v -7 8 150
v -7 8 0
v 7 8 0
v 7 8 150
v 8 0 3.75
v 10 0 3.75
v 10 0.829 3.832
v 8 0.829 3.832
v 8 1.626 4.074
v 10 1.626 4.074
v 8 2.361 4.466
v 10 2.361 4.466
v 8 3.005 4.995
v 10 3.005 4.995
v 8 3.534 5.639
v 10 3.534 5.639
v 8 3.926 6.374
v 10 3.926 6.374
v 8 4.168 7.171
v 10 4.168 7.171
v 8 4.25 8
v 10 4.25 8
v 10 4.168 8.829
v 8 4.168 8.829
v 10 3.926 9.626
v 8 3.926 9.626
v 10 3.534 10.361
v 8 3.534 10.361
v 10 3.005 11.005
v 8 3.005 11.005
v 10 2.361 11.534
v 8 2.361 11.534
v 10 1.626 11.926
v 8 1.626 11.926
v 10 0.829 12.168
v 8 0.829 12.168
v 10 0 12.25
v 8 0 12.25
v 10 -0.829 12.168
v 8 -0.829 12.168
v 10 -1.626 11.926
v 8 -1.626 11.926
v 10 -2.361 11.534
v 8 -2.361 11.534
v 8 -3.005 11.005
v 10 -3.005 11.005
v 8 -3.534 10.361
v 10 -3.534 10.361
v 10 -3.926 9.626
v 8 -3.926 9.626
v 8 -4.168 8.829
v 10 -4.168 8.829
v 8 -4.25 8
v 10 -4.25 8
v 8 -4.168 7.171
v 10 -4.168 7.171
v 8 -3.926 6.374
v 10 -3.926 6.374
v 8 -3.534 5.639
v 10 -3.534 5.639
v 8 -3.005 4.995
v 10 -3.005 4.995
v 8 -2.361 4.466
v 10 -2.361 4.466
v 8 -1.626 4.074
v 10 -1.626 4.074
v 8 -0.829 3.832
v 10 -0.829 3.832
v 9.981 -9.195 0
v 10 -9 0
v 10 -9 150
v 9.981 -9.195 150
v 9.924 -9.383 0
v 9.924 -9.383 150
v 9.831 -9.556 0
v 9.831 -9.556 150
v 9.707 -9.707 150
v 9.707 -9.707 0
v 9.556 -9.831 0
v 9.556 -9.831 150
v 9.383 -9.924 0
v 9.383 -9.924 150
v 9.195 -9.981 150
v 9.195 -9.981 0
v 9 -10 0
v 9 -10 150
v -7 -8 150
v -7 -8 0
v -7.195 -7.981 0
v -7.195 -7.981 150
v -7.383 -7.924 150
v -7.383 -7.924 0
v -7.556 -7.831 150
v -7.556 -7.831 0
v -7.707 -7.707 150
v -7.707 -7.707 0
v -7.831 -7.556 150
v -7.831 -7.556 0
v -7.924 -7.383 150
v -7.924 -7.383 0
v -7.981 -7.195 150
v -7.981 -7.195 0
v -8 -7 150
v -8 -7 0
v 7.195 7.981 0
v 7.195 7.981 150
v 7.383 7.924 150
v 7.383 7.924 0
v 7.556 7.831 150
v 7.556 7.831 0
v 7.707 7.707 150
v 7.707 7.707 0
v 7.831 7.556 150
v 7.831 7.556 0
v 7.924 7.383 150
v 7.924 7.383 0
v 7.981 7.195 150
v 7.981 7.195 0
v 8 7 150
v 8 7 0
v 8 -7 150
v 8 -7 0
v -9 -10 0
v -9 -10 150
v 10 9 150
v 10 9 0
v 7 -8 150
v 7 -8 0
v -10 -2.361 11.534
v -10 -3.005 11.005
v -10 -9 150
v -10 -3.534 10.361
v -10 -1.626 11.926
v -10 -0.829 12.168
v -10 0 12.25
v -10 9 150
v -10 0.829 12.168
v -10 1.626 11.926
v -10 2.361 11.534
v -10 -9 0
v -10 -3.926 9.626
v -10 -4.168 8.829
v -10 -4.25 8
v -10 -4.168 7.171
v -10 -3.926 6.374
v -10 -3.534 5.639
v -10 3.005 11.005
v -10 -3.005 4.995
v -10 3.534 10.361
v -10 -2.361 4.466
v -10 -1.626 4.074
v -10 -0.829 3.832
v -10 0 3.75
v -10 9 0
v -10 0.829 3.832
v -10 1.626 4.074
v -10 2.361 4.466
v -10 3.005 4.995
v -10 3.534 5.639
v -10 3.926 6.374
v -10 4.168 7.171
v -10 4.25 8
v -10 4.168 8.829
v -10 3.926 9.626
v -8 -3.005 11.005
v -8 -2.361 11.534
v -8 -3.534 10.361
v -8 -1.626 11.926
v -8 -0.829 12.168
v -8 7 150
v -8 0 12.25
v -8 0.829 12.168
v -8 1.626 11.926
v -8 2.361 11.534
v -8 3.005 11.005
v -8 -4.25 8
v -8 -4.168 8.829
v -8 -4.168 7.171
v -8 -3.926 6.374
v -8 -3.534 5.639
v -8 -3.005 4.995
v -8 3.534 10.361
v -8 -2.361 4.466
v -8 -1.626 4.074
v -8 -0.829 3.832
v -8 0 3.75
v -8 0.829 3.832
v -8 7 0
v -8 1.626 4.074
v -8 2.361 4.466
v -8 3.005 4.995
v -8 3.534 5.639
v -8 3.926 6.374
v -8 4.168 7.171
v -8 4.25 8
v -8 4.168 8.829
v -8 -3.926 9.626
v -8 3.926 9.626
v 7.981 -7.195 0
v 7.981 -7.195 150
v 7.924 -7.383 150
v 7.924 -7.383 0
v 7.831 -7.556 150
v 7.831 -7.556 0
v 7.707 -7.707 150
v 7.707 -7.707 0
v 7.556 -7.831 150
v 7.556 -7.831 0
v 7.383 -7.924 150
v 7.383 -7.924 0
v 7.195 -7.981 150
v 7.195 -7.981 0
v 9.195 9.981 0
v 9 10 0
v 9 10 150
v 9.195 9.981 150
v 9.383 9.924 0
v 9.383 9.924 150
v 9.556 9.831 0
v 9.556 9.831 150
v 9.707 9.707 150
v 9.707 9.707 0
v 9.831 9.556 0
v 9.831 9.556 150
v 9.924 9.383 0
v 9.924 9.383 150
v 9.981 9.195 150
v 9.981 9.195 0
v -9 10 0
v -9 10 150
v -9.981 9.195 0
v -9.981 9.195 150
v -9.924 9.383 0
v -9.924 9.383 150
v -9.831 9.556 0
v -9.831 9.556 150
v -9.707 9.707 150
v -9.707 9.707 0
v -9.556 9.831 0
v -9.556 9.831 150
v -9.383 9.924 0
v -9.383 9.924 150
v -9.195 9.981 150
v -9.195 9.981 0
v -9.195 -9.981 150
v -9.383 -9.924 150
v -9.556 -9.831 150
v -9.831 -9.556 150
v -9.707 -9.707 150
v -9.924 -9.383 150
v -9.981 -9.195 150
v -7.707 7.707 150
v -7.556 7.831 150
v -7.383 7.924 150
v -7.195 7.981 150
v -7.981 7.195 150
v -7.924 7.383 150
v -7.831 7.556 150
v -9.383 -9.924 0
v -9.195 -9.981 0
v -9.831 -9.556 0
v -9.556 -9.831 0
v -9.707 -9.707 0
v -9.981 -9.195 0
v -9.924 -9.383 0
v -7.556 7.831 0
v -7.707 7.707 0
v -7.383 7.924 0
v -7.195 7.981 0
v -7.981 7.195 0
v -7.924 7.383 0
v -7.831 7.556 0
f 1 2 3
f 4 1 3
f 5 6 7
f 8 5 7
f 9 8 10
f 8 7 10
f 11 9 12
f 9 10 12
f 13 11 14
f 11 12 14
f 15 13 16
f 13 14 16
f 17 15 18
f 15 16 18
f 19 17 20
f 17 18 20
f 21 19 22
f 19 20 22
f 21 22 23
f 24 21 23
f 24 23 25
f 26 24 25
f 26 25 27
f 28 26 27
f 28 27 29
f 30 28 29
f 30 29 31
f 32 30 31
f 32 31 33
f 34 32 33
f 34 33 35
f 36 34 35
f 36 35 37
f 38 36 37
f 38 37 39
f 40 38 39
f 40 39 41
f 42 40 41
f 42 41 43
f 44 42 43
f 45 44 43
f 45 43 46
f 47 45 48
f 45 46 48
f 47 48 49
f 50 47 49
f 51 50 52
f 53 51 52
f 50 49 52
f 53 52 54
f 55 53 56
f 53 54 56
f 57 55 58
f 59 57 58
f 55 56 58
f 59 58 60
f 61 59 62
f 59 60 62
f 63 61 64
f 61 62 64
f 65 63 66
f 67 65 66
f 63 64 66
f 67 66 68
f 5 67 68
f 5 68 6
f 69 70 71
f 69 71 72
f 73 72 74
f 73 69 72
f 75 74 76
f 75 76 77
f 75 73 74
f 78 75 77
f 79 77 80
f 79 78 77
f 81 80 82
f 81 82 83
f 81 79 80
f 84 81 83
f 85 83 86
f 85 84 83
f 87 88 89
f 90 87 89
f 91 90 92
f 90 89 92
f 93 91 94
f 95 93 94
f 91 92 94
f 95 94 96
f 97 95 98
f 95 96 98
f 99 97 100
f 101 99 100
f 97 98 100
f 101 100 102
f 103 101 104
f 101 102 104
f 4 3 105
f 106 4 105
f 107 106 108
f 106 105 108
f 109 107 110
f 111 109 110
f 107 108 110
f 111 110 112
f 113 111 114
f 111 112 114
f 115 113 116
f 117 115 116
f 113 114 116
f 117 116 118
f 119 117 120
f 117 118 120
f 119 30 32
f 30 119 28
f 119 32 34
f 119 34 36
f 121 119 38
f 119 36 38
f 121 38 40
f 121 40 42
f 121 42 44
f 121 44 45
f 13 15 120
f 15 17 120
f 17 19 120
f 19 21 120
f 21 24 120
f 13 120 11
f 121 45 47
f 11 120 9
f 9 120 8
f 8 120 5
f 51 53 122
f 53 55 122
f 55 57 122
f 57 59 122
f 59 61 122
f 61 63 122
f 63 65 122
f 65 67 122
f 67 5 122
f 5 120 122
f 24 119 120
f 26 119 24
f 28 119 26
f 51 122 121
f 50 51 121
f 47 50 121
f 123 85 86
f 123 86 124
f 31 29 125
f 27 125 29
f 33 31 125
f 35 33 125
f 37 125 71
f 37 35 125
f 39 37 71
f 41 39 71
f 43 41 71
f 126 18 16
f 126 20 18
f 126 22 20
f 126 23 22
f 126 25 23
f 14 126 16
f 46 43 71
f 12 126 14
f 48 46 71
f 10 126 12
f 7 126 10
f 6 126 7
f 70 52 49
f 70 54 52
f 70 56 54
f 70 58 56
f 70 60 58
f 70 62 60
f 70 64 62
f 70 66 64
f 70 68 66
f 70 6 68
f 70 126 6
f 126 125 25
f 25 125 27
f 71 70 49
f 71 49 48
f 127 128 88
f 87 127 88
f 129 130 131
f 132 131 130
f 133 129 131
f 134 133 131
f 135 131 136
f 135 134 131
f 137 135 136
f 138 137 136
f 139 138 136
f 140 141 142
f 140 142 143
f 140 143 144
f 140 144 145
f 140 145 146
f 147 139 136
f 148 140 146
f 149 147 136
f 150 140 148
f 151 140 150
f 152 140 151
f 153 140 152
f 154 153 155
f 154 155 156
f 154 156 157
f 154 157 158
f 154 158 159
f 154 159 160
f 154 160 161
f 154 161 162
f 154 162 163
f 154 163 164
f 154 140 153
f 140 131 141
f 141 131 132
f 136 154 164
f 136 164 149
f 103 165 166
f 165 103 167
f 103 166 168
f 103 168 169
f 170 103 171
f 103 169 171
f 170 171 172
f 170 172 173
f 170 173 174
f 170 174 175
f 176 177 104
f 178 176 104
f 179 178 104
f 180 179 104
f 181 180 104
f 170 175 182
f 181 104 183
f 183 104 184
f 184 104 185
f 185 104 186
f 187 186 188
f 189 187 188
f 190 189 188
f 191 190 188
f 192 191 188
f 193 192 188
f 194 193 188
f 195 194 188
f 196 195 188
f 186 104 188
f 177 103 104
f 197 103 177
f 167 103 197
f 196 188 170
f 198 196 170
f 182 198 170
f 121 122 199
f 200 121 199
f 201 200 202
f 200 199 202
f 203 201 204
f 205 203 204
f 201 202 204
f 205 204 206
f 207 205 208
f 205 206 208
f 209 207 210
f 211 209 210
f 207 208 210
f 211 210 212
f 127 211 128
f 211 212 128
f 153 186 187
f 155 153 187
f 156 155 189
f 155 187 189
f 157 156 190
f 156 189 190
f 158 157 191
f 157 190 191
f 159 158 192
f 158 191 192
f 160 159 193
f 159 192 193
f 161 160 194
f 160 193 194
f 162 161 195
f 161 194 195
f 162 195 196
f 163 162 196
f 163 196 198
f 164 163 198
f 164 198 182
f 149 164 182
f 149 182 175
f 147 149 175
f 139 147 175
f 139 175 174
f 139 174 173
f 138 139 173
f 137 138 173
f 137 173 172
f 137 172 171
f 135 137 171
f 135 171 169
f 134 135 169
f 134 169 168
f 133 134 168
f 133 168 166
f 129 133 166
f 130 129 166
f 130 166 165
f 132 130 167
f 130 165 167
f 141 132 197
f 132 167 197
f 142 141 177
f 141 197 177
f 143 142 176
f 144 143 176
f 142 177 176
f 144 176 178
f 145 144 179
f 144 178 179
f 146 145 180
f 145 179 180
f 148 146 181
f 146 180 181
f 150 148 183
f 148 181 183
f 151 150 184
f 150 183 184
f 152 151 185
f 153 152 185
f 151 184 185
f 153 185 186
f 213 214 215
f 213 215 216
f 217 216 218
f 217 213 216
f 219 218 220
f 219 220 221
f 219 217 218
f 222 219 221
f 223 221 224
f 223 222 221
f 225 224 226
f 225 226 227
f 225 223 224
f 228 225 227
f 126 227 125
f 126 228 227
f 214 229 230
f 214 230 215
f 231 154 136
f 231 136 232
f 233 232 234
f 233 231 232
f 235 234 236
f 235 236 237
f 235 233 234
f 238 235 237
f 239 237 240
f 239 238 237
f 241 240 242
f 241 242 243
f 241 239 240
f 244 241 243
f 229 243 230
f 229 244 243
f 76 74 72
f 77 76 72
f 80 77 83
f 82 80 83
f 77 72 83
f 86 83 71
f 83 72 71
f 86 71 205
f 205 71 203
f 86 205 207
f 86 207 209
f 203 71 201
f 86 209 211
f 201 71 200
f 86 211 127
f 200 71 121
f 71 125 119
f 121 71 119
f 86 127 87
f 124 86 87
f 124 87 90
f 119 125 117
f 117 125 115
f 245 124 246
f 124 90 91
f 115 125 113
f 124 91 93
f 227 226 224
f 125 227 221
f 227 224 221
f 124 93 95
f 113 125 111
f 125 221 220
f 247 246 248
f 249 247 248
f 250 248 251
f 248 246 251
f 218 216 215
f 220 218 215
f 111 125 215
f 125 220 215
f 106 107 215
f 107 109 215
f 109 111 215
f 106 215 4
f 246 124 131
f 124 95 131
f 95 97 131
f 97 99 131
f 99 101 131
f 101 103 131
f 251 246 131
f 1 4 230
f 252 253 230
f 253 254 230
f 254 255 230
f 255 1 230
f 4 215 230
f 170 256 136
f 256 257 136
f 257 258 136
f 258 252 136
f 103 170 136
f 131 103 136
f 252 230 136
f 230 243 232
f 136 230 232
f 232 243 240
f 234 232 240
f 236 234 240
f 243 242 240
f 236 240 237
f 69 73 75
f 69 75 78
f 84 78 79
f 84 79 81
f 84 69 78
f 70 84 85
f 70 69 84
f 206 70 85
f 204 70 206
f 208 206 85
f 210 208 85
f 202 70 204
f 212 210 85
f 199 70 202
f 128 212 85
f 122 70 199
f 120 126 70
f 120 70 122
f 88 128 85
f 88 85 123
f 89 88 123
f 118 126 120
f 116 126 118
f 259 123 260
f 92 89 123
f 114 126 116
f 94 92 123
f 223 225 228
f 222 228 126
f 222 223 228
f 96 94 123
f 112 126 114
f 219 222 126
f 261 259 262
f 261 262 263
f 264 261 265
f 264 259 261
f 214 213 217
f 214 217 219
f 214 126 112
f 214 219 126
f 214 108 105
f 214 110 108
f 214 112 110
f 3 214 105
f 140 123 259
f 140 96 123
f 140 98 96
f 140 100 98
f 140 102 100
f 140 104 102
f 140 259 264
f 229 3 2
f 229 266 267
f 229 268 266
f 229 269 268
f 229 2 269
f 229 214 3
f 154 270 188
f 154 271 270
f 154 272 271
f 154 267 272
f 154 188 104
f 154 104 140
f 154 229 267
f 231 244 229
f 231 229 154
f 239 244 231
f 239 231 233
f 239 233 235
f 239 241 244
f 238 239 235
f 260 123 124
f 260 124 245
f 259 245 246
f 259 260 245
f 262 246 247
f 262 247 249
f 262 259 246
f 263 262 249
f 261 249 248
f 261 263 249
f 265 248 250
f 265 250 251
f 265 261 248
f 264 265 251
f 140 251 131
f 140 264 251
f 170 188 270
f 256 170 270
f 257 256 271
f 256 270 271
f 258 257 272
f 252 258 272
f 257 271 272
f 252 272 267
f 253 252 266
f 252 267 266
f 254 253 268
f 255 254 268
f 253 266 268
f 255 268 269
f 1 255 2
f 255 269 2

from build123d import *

# Parameters (mm, degrees)
BOSS_EXTRUDE1_DEPTH = 150
SKETCH2_R           = 4.25
CUT_EXTRUDE1_DEPTH  = 21


with BuildPart() as part:
    # Sketch1 → Boss-Extrude1 (new body)
    with BuildSketch(Plane.XY):
        with BuildLine():
            Line((-9, 10), (9, 10))
            ThreePointArc((9, 10), (9.707106781, 9.707106781), (10, 9))
            Line((10, 9), (10, -9))
            ThreePointArc((10, -9), (9.707106781, -9.707106781), (9, -10))
            Line((9, -10), (-9, -10))
            ThreePointArc((-9, -10), (-9.707106781, -9.707106781), (-10, -9))
            Line((-10, -9), (-10, 9))
            ThreePointArc((-10, 9), (-9.707106781, 9.707106781), (-9, 10))
        make_face()
        with BuildLine():
            Line((-7, 8), (7, 8))
            ThreePointArc((7, 8), (7.707106781, 7.707106781), (8, 7))
            Line((8, 7), (8, -7))
            ThreePointArc((8, -7), (7.707106781, -7.707106781), (7, -8))
            Line((7, -8), (-7, -8))
            ThreePointArc((-7, -8), (-7.707106781, -7.707106781), (-8, -7))
            Line((-8, -7), (-8, 7))
            ThreePointArc((-8, 7), (-7.707106781, 7.707106781), (-7, 8))
        make_face(mode=Mode.SUBTRACT)
    extrude(amount=BOSS_EXTRUDE1_DEPTH)

    # Sketch2 → Cut-Extrude1 (cut, through all)
    with BuildSketch(Plane(origin=(10, 0, 0), x_dir=(0, 0, -1), z_dir=(1, 0, 0))):
        with Locations((-8, 0)):
            Circle(SKETCH2_R)
    extrude(amount=-CUT_EXTRUDE1_DEPTH, mode=Mode.SUBTRACT)


solid = part.part
